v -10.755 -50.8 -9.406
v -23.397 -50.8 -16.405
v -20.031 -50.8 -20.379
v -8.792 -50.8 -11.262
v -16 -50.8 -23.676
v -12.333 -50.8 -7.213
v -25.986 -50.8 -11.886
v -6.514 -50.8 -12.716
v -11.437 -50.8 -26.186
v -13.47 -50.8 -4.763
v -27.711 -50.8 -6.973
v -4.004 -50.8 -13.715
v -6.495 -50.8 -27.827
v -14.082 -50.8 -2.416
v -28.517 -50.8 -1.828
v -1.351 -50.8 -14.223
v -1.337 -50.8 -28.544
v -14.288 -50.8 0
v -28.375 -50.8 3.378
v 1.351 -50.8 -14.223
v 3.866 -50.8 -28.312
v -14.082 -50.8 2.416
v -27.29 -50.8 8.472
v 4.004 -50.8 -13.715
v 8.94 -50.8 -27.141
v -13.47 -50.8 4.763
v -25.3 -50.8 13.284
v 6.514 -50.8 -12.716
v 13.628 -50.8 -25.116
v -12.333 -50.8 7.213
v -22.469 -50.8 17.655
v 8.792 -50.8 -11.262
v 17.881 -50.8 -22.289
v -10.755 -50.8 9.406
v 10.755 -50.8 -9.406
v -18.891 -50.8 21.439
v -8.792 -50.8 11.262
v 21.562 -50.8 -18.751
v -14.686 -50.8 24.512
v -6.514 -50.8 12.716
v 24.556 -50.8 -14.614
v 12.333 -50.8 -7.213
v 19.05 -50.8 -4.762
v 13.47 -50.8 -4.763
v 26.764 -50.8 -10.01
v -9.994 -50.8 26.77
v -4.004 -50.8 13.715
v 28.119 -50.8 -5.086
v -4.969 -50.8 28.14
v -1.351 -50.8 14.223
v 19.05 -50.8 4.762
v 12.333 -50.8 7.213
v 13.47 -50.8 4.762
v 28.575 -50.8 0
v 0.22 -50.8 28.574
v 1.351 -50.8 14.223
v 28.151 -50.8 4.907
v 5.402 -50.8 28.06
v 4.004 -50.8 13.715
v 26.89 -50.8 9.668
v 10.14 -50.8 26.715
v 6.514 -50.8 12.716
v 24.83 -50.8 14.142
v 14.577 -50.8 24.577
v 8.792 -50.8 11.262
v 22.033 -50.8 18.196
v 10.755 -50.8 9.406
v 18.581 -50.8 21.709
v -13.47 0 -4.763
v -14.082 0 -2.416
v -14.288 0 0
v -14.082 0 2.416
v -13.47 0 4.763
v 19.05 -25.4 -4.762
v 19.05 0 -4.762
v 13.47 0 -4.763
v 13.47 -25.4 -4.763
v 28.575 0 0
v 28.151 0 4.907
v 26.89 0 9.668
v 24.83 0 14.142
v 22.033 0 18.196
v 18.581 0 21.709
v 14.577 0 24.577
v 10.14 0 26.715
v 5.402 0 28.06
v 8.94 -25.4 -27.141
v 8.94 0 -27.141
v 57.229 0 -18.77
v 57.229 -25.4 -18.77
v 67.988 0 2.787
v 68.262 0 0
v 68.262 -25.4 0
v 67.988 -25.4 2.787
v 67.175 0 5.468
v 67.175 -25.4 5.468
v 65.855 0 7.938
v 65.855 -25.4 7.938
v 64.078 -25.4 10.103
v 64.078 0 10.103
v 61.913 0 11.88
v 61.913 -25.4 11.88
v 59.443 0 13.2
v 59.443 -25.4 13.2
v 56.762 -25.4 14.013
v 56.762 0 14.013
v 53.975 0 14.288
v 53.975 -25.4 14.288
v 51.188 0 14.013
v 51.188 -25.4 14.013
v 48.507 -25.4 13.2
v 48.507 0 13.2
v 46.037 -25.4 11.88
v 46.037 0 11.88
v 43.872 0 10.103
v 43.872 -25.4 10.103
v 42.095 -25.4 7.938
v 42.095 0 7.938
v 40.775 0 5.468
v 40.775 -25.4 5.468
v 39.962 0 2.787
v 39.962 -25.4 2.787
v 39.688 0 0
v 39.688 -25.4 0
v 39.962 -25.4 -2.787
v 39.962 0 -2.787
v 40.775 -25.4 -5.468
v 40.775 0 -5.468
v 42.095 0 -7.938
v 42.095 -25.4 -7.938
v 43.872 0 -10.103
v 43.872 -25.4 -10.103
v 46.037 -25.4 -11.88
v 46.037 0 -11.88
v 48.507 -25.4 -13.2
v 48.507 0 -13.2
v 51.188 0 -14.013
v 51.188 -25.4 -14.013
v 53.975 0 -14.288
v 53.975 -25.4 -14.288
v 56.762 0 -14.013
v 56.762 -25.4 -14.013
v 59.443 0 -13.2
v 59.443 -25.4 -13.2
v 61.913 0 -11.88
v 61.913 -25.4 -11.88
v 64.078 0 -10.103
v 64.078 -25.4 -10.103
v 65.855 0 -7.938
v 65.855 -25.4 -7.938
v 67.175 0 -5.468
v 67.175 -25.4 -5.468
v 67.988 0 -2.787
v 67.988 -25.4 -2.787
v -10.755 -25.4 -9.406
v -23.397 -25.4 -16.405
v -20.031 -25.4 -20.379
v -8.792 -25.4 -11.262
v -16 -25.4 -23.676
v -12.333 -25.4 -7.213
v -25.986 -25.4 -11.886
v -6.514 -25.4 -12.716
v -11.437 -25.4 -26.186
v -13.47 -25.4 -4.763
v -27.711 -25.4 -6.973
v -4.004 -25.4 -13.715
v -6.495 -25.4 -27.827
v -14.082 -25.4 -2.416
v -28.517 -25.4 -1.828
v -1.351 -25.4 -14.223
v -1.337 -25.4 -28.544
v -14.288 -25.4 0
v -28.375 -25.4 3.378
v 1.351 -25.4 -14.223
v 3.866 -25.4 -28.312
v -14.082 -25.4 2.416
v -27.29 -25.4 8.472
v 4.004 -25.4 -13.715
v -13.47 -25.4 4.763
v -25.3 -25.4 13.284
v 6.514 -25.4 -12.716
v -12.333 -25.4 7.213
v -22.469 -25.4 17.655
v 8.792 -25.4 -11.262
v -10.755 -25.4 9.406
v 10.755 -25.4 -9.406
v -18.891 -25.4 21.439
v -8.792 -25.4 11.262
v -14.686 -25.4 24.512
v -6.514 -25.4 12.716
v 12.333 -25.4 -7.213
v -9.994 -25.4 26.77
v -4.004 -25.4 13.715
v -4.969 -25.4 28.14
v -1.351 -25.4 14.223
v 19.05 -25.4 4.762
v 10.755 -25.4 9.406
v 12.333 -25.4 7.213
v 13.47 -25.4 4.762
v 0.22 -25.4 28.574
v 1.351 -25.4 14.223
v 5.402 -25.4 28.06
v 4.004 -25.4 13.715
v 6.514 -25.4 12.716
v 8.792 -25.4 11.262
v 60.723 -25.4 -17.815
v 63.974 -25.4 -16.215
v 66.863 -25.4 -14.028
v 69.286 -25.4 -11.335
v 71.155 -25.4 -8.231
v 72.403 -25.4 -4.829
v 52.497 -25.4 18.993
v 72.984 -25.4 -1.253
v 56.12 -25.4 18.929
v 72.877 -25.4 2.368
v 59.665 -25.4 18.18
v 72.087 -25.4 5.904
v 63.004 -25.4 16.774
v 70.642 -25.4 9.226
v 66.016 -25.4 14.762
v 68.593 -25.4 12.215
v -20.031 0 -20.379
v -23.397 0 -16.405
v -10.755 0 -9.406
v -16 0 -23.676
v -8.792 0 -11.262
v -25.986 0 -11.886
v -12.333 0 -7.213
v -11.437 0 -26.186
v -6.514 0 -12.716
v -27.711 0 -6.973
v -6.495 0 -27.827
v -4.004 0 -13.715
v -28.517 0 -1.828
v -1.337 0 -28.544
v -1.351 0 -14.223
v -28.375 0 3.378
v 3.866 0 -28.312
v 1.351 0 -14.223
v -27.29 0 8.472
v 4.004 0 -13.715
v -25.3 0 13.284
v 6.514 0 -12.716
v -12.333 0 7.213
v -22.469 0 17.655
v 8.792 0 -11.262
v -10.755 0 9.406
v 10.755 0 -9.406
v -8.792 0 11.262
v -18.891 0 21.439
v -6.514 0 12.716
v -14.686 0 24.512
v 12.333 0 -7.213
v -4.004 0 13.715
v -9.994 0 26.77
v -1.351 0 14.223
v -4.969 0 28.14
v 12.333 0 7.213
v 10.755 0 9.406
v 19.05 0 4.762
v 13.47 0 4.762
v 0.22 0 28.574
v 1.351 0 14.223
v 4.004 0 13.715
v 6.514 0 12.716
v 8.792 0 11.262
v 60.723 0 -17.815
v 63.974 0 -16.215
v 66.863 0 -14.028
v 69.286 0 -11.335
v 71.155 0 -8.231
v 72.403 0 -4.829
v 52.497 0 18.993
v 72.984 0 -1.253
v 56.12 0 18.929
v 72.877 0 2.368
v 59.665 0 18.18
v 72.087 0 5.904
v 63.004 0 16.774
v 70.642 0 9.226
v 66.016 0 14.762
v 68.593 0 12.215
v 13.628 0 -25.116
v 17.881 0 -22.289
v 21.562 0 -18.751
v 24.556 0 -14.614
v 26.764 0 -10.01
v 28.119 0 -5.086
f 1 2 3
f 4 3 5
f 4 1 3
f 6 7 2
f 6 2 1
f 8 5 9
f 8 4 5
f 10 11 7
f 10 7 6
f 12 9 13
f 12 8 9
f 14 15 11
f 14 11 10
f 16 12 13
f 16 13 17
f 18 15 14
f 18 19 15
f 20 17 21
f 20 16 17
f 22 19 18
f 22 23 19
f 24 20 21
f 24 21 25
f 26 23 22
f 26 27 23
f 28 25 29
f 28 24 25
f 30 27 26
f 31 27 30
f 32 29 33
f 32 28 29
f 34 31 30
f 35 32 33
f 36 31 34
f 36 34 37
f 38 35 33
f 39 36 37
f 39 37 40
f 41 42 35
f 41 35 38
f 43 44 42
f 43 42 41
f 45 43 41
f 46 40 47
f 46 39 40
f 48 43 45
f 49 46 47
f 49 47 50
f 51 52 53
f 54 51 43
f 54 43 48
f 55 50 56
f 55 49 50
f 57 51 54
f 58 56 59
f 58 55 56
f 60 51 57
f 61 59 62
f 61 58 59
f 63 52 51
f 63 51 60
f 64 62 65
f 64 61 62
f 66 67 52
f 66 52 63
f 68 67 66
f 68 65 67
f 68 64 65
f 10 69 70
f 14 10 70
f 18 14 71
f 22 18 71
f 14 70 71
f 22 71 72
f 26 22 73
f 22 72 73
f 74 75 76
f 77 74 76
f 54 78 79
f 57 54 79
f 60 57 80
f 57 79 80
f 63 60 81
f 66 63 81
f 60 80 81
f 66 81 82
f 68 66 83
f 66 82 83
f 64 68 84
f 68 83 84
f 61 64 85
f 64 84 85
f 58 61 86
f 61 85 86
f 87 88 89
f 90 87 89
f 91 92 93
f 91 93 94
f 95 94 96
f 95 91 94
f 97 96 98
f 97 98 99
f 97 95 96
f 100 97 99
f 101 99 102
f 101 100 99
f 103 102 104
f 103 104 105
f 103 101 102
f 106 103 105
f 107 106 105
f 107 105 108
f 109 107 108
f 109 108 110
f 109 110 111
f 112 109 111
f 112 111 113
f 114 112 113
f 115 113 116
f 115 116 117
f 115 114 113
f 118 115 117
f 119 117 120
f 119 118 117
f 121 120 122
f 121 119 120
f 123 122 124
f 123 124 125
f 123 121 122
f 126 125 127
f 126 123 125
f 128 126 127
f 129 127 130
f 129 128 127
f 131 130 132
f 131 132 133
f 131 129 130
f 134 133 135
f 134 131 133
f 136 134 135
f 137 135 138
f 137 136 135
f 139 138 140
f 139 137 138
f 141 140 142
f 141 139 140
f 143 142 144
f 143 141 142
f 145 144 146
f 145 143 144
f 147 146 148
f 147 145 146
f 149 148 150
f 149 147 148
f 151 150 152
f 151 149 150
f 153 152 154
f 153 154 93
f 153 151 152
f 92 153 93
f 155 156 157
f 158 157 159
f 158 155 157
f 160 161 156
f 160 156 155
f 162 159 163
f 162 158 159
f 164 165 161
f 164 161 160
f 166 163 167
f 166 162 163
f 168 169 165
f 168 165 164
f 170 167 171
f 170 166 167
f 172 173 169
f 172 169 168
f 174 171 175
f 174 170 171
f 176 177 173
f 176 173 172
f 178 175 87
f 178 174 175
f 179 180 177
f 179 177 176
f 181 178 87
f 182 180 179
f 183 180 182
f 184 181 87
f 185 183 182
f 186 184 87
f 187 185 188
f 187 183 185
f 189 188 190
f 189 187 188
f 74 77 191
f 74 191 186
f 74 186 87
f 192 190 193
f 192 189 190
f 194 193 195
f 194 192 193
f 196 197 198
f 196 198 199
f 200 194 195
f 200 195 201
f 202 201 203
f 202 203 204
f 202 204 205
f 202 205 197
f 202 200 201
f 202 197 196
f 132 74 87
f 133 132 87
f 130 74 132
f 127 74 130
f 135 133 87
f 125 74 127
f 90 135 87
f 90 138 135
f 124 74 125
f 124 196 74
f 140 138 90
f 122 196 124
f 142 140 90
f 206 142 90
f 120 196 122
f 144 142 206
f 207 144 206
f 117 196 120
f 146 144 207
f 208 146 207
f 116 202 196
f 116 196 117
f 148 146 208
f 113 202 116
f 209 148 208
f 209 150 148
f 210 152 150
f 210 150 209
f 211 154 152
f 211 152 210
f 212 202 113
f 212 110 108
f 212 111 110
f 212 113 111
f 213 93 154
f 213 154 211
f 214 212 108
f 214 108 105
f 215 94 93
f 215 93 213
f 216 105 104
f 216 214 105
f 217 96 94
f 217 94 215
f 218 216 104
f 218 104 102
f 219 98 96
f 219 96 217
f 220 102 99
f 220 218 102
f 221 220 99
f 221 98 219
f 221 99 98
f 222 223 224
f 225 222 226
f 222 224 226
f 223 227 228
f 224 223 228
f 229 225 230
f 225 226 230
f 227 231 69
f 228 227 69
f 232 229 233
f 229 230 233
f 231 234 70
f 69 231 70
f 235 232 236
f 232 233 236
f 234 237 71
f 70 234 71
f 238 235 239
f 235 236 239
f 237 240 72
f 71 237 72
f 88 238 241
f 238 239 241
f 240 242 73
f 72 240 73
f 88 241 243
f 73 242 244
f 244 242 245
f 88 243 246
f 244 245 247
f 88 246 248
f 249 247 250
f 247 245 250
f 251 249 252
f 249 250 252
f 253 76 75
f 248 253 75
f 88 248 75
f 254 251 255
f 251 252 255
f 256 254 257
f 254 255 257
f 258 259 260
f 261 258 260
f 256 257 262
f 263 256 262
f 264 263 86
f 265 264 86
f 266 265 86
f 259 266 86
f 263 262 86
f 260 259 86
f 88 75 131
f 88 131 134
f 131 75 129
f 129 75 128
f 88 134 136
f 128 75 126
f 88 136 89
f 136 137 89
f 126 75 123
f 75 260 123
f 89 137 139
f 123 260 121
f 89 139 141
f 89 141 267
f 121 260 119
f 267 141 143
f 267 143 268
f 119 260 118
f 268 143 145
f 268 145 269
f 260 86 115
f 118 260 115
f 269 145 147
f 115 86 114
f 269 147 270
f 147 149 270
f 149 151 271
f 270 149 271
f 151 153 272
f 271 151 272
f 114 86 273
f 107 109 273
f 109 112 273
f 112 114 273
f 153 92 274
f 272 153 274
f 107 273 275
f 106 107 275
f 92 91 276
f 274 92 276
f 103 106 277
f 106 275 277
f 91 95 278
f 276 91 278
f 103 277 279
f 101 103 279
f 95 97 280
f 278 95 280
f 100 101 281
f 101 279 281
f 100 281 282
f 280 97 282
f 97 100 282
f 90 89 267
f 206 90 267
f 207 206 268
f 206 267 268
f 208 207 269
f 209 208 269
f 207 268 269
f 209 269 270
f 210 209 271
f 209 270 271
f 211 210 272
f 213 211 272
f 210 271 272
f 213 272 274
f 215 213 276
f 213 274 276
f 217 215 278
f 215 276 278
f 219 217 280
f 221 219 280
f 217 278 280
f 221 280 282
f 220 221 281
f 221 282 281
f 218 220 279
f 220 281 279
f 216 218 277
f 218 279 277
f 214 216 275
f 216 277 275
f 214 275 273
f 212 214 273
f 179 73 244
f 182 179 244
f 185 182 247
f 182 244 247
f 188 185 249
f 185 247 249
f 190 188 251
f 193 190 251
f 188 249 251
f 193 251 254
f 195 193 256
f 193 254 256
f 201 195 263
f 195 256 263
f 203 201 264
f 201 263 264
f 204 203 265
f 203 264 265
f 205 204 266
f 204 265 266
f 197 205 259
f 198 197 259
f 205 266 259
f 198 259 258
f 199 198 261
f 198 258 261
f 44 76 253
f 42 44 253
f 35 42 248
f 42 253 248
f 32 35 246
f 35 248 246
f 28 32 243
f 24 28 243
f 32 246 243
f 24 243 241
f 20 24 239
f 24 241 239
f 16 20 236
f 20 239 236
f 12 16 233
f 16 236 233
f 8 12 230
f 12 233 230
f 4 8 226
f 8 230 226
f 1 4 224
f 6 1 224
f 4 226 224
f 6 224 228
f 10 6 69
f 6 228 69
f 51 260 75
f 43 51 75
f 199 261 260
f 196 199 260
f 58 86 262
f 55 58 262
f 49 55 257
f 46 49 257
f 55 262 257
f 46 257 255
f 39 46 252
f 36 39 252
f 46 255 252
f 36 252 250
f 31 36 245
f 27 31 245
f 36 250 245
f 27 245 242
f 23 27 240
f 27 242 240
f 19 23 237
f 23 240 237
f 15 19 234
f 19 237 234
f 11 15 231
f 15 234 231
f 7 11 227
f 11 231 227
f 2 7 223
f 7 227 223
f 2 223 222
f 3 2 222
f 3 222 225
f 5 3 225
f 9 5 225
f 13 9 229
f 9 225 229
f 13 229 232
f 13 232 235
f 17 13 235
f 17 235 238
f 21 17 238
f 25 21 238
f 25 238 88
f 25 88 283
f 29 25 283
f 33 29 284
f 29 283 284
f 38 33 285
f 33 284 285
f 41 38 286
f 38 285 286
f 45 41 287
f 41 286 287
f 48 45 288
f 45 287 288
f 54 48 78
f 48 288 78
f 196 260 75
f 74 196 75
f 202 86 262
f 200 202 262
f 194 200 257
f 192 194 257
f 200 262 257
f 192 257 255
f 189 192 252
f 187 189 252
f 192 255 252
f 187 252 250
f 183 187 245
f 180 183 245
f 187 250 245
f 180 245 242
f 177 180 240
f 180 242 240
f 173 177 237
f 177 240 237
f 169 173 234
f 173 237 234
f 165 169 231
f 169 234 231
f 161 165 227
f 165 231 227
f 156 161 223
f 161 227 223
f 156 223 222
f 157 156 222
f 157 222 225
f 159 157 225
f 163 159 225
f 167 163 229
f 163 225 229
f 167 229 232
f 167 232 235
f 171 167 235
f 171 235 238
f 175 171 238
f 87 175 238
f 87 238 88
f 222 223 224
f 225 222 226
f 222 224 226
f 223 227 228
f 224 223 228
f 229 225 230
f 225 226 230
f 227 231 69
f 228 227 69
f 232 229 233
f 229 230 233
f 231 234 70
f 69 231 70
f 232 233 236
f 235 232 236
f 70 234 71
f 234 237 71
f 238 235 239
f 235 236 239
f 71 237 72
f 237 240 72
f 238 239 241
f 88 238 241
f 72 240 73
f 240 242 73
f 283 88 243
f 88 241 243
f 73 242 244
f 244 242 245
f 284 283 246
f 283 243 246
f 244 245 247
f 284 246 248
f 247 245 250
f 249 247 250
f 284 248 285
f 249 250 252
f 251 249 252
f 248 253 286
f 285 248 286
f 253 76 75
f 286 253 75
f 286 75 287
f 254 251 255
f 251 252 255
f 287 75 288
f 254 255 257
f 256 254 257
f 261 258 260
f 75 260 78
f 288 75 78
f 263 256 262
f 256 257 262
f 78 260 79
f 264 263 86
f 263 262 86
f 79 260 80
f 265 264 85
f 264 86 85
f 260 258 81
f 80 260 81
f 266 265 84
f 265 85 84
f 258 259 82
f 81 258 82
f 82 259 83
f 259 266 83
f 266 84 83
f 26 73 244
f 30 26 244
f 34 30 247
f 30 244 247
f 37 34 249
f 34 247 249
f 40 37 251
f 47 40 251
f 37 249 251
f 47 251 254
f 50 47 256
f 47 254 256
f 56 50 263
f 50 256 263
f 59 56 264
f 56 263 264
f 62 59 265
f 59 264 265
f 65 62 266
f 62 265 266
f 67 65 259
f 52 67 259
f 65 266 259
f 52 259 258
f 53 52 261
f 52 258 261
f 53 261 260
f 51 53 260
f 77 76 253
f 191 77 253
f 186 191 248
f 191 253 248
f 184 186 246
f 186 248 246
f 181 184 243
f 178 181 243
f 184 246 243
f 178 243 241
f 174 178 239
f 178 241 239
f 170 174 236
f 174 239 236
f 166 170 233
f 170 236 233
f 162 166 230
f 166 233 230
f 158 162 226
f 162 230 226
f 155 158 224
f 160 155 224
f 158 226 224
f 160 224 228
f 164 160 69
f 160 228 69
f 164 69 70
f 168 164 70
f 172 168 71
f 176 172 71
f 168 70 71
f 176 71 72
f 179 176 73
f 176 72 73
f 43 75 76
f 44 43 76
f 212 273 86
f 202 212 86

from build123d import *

# Parameters (mm, degrees)
F0_R     = 14.2875
F1_DEPTH = 25.4
F2_DEPTH = 50.8


with BuildPart() as f1:
    # F0 (on Front) → F1 (new body)
    with BuildSketch(Plane.XZ):
        with BuildLine():
            ThreePointArc((8.9398230942, -27.1405635174), (23.1515233831, -16.7492564026), (28.575, 0))
            ThreePointArc((28.575, 0), (22.0329266955, 18.19562492), (5.4022429586, 28.0596934412))
            ThreePointArc((5.4022429586, 28.0596934412), (-28.5165006048, -1.8275169652), (8.9398230942, -27.1405635174))
        make_face()
        with BuildLine():
            ThreePointArc((-13.4703841816, 4.7625), (0, 14.2875), (13.4703841816, 4.7625))
            Line((13.4703841816, 4.7625), (19.05, 4.7625))
            Line((19.05, 4.7625), (19.05, -4.7625))
            Line((19.05, -4.7625), (13.4703841816, -4.7625))
            ThreePointArc((13.4703841816, -4.7625), (0, -14.2875), (-13.4703841816, -4.7625))
            Line((-13.4703841816, -4.7625), (-19.05, -4.7625))
            Line((-19.05, -4.7625), (-19.05, 4.7625))
            Line((-19.05, 4.7625), (-13.4703841816, 4.7625))
        make_face(mode=Mode.SUBTRACT)
        with BuildLine():
            ThreePointArc((73.025, 0), (66.9124367976, 13.9830336161), (52.4974168915, 18.9926103566))
            ThreePointArc((52.4974168915, 18.9926103566), (35.0727779504, -2.3682275199), (57.2286420445, -18.770090928))
            ThreePointArc((57.2286420445, -18.770090928), (68.5503967518, -12.2662263768), (73.025, 0))
        make_face()
        with Locations((53.975, 0)):
            Circle(F0_R, mode=Mode.SUBTRACT)
        with BuildLine():
            ThreePointArc((5.4022429586, 28.0596934412), (22.0329266955, 18.19562492), (28.575, 0))
            ThreePointArc((28.575, 0), (23.1515233831, -16.7492564026), (8.9398230942, -27.1405635174))
            Line((8.9398230942, -27.1405635174), (57.2286420445, -18.770090928))
            ThreePointArc((57.2286420445, -18.770090928), (35.0727779504, -2.3682275199), (52.4974168915, 18.9926103566))
            Line((52.4974168915, 18.9926103566), (5.4022429586, 28.0596934412))
        make_face()
        with BuildLine():
            ThreePointArc((-13.4703841816, -4.7625), (-14.2875, 0), (-13.4703841816, 4.7625))
            Line((-13.4703841816, 4.7625), (-19.05, 4.7625))
            Line((-19.05, 4.7625), (-19.05, -4.7625))
            Line((-19.05, -4.7625), (-13.4703841816, -4.7625))
        make_face()
    extrude(amount=F1_DEPTH)


with BuildPart() as f2:
    # F0 (on Front) → F2 (new body)
    with BuildSketch(Plane.XZ):
        with BuildLine():
            ThreePointArc((8.9398230942, -27.1405635174), (23.1515233831, -16.7492564026), (28.575, 0))
            ThreePointArc((28.575, 0), (22.0329266955, 18.19562492), (5.4022429586, 28.0596934412))
            ThreePointArc((5.4022429586, 28.0596934412), (-28.5165006048, -1.8275169652), (8.9398230942, -27.1405635174))
        make_face()
        with BuildLine():
            ThreePointArc((-13.4703841816, 4.7625), (0, 14.2875), (13.4703841816, 4.7625))
            Line((13.4703841816, 4.7625), (19.05, 4.7625))
            Line((19.05, 4.7625), (19.05, -4.7625))
            Line((19.05, -4.7625), (13.4703841816, -4.7625))
            ThreePointArc((13.4703841816, -4.7625), (0, -14.2875), (-13.4703841816, -4.7625))
            Line((-13.4703841816, -4.7625), (-19.05, -4.7625))
            Line((-19.05, -4.7625), (-19.05, 4.7625))
            Line((-19.05, 4.7625), (-13.4703841816, 4.7625))
        make_face(mode=Mode.SUBTRACT)
        with BuildLine():
            ThreePointArc((-13.4703841816, -4.7625), (-14.2875, 0), (-13.4703841816, 4.7625))
            Line((-13.4703841816, 4.7625), (-19.05, 4.7625))
            Line((-19.05, 4.7625), (-19.05, -4.7625))
            Line((-19.05, -4.7625), (-13.4703841816, -4.7625))
        make_face()
    extrude(amount=F2_DEPTH)


solid = Compound([f1.part, f2.part])
